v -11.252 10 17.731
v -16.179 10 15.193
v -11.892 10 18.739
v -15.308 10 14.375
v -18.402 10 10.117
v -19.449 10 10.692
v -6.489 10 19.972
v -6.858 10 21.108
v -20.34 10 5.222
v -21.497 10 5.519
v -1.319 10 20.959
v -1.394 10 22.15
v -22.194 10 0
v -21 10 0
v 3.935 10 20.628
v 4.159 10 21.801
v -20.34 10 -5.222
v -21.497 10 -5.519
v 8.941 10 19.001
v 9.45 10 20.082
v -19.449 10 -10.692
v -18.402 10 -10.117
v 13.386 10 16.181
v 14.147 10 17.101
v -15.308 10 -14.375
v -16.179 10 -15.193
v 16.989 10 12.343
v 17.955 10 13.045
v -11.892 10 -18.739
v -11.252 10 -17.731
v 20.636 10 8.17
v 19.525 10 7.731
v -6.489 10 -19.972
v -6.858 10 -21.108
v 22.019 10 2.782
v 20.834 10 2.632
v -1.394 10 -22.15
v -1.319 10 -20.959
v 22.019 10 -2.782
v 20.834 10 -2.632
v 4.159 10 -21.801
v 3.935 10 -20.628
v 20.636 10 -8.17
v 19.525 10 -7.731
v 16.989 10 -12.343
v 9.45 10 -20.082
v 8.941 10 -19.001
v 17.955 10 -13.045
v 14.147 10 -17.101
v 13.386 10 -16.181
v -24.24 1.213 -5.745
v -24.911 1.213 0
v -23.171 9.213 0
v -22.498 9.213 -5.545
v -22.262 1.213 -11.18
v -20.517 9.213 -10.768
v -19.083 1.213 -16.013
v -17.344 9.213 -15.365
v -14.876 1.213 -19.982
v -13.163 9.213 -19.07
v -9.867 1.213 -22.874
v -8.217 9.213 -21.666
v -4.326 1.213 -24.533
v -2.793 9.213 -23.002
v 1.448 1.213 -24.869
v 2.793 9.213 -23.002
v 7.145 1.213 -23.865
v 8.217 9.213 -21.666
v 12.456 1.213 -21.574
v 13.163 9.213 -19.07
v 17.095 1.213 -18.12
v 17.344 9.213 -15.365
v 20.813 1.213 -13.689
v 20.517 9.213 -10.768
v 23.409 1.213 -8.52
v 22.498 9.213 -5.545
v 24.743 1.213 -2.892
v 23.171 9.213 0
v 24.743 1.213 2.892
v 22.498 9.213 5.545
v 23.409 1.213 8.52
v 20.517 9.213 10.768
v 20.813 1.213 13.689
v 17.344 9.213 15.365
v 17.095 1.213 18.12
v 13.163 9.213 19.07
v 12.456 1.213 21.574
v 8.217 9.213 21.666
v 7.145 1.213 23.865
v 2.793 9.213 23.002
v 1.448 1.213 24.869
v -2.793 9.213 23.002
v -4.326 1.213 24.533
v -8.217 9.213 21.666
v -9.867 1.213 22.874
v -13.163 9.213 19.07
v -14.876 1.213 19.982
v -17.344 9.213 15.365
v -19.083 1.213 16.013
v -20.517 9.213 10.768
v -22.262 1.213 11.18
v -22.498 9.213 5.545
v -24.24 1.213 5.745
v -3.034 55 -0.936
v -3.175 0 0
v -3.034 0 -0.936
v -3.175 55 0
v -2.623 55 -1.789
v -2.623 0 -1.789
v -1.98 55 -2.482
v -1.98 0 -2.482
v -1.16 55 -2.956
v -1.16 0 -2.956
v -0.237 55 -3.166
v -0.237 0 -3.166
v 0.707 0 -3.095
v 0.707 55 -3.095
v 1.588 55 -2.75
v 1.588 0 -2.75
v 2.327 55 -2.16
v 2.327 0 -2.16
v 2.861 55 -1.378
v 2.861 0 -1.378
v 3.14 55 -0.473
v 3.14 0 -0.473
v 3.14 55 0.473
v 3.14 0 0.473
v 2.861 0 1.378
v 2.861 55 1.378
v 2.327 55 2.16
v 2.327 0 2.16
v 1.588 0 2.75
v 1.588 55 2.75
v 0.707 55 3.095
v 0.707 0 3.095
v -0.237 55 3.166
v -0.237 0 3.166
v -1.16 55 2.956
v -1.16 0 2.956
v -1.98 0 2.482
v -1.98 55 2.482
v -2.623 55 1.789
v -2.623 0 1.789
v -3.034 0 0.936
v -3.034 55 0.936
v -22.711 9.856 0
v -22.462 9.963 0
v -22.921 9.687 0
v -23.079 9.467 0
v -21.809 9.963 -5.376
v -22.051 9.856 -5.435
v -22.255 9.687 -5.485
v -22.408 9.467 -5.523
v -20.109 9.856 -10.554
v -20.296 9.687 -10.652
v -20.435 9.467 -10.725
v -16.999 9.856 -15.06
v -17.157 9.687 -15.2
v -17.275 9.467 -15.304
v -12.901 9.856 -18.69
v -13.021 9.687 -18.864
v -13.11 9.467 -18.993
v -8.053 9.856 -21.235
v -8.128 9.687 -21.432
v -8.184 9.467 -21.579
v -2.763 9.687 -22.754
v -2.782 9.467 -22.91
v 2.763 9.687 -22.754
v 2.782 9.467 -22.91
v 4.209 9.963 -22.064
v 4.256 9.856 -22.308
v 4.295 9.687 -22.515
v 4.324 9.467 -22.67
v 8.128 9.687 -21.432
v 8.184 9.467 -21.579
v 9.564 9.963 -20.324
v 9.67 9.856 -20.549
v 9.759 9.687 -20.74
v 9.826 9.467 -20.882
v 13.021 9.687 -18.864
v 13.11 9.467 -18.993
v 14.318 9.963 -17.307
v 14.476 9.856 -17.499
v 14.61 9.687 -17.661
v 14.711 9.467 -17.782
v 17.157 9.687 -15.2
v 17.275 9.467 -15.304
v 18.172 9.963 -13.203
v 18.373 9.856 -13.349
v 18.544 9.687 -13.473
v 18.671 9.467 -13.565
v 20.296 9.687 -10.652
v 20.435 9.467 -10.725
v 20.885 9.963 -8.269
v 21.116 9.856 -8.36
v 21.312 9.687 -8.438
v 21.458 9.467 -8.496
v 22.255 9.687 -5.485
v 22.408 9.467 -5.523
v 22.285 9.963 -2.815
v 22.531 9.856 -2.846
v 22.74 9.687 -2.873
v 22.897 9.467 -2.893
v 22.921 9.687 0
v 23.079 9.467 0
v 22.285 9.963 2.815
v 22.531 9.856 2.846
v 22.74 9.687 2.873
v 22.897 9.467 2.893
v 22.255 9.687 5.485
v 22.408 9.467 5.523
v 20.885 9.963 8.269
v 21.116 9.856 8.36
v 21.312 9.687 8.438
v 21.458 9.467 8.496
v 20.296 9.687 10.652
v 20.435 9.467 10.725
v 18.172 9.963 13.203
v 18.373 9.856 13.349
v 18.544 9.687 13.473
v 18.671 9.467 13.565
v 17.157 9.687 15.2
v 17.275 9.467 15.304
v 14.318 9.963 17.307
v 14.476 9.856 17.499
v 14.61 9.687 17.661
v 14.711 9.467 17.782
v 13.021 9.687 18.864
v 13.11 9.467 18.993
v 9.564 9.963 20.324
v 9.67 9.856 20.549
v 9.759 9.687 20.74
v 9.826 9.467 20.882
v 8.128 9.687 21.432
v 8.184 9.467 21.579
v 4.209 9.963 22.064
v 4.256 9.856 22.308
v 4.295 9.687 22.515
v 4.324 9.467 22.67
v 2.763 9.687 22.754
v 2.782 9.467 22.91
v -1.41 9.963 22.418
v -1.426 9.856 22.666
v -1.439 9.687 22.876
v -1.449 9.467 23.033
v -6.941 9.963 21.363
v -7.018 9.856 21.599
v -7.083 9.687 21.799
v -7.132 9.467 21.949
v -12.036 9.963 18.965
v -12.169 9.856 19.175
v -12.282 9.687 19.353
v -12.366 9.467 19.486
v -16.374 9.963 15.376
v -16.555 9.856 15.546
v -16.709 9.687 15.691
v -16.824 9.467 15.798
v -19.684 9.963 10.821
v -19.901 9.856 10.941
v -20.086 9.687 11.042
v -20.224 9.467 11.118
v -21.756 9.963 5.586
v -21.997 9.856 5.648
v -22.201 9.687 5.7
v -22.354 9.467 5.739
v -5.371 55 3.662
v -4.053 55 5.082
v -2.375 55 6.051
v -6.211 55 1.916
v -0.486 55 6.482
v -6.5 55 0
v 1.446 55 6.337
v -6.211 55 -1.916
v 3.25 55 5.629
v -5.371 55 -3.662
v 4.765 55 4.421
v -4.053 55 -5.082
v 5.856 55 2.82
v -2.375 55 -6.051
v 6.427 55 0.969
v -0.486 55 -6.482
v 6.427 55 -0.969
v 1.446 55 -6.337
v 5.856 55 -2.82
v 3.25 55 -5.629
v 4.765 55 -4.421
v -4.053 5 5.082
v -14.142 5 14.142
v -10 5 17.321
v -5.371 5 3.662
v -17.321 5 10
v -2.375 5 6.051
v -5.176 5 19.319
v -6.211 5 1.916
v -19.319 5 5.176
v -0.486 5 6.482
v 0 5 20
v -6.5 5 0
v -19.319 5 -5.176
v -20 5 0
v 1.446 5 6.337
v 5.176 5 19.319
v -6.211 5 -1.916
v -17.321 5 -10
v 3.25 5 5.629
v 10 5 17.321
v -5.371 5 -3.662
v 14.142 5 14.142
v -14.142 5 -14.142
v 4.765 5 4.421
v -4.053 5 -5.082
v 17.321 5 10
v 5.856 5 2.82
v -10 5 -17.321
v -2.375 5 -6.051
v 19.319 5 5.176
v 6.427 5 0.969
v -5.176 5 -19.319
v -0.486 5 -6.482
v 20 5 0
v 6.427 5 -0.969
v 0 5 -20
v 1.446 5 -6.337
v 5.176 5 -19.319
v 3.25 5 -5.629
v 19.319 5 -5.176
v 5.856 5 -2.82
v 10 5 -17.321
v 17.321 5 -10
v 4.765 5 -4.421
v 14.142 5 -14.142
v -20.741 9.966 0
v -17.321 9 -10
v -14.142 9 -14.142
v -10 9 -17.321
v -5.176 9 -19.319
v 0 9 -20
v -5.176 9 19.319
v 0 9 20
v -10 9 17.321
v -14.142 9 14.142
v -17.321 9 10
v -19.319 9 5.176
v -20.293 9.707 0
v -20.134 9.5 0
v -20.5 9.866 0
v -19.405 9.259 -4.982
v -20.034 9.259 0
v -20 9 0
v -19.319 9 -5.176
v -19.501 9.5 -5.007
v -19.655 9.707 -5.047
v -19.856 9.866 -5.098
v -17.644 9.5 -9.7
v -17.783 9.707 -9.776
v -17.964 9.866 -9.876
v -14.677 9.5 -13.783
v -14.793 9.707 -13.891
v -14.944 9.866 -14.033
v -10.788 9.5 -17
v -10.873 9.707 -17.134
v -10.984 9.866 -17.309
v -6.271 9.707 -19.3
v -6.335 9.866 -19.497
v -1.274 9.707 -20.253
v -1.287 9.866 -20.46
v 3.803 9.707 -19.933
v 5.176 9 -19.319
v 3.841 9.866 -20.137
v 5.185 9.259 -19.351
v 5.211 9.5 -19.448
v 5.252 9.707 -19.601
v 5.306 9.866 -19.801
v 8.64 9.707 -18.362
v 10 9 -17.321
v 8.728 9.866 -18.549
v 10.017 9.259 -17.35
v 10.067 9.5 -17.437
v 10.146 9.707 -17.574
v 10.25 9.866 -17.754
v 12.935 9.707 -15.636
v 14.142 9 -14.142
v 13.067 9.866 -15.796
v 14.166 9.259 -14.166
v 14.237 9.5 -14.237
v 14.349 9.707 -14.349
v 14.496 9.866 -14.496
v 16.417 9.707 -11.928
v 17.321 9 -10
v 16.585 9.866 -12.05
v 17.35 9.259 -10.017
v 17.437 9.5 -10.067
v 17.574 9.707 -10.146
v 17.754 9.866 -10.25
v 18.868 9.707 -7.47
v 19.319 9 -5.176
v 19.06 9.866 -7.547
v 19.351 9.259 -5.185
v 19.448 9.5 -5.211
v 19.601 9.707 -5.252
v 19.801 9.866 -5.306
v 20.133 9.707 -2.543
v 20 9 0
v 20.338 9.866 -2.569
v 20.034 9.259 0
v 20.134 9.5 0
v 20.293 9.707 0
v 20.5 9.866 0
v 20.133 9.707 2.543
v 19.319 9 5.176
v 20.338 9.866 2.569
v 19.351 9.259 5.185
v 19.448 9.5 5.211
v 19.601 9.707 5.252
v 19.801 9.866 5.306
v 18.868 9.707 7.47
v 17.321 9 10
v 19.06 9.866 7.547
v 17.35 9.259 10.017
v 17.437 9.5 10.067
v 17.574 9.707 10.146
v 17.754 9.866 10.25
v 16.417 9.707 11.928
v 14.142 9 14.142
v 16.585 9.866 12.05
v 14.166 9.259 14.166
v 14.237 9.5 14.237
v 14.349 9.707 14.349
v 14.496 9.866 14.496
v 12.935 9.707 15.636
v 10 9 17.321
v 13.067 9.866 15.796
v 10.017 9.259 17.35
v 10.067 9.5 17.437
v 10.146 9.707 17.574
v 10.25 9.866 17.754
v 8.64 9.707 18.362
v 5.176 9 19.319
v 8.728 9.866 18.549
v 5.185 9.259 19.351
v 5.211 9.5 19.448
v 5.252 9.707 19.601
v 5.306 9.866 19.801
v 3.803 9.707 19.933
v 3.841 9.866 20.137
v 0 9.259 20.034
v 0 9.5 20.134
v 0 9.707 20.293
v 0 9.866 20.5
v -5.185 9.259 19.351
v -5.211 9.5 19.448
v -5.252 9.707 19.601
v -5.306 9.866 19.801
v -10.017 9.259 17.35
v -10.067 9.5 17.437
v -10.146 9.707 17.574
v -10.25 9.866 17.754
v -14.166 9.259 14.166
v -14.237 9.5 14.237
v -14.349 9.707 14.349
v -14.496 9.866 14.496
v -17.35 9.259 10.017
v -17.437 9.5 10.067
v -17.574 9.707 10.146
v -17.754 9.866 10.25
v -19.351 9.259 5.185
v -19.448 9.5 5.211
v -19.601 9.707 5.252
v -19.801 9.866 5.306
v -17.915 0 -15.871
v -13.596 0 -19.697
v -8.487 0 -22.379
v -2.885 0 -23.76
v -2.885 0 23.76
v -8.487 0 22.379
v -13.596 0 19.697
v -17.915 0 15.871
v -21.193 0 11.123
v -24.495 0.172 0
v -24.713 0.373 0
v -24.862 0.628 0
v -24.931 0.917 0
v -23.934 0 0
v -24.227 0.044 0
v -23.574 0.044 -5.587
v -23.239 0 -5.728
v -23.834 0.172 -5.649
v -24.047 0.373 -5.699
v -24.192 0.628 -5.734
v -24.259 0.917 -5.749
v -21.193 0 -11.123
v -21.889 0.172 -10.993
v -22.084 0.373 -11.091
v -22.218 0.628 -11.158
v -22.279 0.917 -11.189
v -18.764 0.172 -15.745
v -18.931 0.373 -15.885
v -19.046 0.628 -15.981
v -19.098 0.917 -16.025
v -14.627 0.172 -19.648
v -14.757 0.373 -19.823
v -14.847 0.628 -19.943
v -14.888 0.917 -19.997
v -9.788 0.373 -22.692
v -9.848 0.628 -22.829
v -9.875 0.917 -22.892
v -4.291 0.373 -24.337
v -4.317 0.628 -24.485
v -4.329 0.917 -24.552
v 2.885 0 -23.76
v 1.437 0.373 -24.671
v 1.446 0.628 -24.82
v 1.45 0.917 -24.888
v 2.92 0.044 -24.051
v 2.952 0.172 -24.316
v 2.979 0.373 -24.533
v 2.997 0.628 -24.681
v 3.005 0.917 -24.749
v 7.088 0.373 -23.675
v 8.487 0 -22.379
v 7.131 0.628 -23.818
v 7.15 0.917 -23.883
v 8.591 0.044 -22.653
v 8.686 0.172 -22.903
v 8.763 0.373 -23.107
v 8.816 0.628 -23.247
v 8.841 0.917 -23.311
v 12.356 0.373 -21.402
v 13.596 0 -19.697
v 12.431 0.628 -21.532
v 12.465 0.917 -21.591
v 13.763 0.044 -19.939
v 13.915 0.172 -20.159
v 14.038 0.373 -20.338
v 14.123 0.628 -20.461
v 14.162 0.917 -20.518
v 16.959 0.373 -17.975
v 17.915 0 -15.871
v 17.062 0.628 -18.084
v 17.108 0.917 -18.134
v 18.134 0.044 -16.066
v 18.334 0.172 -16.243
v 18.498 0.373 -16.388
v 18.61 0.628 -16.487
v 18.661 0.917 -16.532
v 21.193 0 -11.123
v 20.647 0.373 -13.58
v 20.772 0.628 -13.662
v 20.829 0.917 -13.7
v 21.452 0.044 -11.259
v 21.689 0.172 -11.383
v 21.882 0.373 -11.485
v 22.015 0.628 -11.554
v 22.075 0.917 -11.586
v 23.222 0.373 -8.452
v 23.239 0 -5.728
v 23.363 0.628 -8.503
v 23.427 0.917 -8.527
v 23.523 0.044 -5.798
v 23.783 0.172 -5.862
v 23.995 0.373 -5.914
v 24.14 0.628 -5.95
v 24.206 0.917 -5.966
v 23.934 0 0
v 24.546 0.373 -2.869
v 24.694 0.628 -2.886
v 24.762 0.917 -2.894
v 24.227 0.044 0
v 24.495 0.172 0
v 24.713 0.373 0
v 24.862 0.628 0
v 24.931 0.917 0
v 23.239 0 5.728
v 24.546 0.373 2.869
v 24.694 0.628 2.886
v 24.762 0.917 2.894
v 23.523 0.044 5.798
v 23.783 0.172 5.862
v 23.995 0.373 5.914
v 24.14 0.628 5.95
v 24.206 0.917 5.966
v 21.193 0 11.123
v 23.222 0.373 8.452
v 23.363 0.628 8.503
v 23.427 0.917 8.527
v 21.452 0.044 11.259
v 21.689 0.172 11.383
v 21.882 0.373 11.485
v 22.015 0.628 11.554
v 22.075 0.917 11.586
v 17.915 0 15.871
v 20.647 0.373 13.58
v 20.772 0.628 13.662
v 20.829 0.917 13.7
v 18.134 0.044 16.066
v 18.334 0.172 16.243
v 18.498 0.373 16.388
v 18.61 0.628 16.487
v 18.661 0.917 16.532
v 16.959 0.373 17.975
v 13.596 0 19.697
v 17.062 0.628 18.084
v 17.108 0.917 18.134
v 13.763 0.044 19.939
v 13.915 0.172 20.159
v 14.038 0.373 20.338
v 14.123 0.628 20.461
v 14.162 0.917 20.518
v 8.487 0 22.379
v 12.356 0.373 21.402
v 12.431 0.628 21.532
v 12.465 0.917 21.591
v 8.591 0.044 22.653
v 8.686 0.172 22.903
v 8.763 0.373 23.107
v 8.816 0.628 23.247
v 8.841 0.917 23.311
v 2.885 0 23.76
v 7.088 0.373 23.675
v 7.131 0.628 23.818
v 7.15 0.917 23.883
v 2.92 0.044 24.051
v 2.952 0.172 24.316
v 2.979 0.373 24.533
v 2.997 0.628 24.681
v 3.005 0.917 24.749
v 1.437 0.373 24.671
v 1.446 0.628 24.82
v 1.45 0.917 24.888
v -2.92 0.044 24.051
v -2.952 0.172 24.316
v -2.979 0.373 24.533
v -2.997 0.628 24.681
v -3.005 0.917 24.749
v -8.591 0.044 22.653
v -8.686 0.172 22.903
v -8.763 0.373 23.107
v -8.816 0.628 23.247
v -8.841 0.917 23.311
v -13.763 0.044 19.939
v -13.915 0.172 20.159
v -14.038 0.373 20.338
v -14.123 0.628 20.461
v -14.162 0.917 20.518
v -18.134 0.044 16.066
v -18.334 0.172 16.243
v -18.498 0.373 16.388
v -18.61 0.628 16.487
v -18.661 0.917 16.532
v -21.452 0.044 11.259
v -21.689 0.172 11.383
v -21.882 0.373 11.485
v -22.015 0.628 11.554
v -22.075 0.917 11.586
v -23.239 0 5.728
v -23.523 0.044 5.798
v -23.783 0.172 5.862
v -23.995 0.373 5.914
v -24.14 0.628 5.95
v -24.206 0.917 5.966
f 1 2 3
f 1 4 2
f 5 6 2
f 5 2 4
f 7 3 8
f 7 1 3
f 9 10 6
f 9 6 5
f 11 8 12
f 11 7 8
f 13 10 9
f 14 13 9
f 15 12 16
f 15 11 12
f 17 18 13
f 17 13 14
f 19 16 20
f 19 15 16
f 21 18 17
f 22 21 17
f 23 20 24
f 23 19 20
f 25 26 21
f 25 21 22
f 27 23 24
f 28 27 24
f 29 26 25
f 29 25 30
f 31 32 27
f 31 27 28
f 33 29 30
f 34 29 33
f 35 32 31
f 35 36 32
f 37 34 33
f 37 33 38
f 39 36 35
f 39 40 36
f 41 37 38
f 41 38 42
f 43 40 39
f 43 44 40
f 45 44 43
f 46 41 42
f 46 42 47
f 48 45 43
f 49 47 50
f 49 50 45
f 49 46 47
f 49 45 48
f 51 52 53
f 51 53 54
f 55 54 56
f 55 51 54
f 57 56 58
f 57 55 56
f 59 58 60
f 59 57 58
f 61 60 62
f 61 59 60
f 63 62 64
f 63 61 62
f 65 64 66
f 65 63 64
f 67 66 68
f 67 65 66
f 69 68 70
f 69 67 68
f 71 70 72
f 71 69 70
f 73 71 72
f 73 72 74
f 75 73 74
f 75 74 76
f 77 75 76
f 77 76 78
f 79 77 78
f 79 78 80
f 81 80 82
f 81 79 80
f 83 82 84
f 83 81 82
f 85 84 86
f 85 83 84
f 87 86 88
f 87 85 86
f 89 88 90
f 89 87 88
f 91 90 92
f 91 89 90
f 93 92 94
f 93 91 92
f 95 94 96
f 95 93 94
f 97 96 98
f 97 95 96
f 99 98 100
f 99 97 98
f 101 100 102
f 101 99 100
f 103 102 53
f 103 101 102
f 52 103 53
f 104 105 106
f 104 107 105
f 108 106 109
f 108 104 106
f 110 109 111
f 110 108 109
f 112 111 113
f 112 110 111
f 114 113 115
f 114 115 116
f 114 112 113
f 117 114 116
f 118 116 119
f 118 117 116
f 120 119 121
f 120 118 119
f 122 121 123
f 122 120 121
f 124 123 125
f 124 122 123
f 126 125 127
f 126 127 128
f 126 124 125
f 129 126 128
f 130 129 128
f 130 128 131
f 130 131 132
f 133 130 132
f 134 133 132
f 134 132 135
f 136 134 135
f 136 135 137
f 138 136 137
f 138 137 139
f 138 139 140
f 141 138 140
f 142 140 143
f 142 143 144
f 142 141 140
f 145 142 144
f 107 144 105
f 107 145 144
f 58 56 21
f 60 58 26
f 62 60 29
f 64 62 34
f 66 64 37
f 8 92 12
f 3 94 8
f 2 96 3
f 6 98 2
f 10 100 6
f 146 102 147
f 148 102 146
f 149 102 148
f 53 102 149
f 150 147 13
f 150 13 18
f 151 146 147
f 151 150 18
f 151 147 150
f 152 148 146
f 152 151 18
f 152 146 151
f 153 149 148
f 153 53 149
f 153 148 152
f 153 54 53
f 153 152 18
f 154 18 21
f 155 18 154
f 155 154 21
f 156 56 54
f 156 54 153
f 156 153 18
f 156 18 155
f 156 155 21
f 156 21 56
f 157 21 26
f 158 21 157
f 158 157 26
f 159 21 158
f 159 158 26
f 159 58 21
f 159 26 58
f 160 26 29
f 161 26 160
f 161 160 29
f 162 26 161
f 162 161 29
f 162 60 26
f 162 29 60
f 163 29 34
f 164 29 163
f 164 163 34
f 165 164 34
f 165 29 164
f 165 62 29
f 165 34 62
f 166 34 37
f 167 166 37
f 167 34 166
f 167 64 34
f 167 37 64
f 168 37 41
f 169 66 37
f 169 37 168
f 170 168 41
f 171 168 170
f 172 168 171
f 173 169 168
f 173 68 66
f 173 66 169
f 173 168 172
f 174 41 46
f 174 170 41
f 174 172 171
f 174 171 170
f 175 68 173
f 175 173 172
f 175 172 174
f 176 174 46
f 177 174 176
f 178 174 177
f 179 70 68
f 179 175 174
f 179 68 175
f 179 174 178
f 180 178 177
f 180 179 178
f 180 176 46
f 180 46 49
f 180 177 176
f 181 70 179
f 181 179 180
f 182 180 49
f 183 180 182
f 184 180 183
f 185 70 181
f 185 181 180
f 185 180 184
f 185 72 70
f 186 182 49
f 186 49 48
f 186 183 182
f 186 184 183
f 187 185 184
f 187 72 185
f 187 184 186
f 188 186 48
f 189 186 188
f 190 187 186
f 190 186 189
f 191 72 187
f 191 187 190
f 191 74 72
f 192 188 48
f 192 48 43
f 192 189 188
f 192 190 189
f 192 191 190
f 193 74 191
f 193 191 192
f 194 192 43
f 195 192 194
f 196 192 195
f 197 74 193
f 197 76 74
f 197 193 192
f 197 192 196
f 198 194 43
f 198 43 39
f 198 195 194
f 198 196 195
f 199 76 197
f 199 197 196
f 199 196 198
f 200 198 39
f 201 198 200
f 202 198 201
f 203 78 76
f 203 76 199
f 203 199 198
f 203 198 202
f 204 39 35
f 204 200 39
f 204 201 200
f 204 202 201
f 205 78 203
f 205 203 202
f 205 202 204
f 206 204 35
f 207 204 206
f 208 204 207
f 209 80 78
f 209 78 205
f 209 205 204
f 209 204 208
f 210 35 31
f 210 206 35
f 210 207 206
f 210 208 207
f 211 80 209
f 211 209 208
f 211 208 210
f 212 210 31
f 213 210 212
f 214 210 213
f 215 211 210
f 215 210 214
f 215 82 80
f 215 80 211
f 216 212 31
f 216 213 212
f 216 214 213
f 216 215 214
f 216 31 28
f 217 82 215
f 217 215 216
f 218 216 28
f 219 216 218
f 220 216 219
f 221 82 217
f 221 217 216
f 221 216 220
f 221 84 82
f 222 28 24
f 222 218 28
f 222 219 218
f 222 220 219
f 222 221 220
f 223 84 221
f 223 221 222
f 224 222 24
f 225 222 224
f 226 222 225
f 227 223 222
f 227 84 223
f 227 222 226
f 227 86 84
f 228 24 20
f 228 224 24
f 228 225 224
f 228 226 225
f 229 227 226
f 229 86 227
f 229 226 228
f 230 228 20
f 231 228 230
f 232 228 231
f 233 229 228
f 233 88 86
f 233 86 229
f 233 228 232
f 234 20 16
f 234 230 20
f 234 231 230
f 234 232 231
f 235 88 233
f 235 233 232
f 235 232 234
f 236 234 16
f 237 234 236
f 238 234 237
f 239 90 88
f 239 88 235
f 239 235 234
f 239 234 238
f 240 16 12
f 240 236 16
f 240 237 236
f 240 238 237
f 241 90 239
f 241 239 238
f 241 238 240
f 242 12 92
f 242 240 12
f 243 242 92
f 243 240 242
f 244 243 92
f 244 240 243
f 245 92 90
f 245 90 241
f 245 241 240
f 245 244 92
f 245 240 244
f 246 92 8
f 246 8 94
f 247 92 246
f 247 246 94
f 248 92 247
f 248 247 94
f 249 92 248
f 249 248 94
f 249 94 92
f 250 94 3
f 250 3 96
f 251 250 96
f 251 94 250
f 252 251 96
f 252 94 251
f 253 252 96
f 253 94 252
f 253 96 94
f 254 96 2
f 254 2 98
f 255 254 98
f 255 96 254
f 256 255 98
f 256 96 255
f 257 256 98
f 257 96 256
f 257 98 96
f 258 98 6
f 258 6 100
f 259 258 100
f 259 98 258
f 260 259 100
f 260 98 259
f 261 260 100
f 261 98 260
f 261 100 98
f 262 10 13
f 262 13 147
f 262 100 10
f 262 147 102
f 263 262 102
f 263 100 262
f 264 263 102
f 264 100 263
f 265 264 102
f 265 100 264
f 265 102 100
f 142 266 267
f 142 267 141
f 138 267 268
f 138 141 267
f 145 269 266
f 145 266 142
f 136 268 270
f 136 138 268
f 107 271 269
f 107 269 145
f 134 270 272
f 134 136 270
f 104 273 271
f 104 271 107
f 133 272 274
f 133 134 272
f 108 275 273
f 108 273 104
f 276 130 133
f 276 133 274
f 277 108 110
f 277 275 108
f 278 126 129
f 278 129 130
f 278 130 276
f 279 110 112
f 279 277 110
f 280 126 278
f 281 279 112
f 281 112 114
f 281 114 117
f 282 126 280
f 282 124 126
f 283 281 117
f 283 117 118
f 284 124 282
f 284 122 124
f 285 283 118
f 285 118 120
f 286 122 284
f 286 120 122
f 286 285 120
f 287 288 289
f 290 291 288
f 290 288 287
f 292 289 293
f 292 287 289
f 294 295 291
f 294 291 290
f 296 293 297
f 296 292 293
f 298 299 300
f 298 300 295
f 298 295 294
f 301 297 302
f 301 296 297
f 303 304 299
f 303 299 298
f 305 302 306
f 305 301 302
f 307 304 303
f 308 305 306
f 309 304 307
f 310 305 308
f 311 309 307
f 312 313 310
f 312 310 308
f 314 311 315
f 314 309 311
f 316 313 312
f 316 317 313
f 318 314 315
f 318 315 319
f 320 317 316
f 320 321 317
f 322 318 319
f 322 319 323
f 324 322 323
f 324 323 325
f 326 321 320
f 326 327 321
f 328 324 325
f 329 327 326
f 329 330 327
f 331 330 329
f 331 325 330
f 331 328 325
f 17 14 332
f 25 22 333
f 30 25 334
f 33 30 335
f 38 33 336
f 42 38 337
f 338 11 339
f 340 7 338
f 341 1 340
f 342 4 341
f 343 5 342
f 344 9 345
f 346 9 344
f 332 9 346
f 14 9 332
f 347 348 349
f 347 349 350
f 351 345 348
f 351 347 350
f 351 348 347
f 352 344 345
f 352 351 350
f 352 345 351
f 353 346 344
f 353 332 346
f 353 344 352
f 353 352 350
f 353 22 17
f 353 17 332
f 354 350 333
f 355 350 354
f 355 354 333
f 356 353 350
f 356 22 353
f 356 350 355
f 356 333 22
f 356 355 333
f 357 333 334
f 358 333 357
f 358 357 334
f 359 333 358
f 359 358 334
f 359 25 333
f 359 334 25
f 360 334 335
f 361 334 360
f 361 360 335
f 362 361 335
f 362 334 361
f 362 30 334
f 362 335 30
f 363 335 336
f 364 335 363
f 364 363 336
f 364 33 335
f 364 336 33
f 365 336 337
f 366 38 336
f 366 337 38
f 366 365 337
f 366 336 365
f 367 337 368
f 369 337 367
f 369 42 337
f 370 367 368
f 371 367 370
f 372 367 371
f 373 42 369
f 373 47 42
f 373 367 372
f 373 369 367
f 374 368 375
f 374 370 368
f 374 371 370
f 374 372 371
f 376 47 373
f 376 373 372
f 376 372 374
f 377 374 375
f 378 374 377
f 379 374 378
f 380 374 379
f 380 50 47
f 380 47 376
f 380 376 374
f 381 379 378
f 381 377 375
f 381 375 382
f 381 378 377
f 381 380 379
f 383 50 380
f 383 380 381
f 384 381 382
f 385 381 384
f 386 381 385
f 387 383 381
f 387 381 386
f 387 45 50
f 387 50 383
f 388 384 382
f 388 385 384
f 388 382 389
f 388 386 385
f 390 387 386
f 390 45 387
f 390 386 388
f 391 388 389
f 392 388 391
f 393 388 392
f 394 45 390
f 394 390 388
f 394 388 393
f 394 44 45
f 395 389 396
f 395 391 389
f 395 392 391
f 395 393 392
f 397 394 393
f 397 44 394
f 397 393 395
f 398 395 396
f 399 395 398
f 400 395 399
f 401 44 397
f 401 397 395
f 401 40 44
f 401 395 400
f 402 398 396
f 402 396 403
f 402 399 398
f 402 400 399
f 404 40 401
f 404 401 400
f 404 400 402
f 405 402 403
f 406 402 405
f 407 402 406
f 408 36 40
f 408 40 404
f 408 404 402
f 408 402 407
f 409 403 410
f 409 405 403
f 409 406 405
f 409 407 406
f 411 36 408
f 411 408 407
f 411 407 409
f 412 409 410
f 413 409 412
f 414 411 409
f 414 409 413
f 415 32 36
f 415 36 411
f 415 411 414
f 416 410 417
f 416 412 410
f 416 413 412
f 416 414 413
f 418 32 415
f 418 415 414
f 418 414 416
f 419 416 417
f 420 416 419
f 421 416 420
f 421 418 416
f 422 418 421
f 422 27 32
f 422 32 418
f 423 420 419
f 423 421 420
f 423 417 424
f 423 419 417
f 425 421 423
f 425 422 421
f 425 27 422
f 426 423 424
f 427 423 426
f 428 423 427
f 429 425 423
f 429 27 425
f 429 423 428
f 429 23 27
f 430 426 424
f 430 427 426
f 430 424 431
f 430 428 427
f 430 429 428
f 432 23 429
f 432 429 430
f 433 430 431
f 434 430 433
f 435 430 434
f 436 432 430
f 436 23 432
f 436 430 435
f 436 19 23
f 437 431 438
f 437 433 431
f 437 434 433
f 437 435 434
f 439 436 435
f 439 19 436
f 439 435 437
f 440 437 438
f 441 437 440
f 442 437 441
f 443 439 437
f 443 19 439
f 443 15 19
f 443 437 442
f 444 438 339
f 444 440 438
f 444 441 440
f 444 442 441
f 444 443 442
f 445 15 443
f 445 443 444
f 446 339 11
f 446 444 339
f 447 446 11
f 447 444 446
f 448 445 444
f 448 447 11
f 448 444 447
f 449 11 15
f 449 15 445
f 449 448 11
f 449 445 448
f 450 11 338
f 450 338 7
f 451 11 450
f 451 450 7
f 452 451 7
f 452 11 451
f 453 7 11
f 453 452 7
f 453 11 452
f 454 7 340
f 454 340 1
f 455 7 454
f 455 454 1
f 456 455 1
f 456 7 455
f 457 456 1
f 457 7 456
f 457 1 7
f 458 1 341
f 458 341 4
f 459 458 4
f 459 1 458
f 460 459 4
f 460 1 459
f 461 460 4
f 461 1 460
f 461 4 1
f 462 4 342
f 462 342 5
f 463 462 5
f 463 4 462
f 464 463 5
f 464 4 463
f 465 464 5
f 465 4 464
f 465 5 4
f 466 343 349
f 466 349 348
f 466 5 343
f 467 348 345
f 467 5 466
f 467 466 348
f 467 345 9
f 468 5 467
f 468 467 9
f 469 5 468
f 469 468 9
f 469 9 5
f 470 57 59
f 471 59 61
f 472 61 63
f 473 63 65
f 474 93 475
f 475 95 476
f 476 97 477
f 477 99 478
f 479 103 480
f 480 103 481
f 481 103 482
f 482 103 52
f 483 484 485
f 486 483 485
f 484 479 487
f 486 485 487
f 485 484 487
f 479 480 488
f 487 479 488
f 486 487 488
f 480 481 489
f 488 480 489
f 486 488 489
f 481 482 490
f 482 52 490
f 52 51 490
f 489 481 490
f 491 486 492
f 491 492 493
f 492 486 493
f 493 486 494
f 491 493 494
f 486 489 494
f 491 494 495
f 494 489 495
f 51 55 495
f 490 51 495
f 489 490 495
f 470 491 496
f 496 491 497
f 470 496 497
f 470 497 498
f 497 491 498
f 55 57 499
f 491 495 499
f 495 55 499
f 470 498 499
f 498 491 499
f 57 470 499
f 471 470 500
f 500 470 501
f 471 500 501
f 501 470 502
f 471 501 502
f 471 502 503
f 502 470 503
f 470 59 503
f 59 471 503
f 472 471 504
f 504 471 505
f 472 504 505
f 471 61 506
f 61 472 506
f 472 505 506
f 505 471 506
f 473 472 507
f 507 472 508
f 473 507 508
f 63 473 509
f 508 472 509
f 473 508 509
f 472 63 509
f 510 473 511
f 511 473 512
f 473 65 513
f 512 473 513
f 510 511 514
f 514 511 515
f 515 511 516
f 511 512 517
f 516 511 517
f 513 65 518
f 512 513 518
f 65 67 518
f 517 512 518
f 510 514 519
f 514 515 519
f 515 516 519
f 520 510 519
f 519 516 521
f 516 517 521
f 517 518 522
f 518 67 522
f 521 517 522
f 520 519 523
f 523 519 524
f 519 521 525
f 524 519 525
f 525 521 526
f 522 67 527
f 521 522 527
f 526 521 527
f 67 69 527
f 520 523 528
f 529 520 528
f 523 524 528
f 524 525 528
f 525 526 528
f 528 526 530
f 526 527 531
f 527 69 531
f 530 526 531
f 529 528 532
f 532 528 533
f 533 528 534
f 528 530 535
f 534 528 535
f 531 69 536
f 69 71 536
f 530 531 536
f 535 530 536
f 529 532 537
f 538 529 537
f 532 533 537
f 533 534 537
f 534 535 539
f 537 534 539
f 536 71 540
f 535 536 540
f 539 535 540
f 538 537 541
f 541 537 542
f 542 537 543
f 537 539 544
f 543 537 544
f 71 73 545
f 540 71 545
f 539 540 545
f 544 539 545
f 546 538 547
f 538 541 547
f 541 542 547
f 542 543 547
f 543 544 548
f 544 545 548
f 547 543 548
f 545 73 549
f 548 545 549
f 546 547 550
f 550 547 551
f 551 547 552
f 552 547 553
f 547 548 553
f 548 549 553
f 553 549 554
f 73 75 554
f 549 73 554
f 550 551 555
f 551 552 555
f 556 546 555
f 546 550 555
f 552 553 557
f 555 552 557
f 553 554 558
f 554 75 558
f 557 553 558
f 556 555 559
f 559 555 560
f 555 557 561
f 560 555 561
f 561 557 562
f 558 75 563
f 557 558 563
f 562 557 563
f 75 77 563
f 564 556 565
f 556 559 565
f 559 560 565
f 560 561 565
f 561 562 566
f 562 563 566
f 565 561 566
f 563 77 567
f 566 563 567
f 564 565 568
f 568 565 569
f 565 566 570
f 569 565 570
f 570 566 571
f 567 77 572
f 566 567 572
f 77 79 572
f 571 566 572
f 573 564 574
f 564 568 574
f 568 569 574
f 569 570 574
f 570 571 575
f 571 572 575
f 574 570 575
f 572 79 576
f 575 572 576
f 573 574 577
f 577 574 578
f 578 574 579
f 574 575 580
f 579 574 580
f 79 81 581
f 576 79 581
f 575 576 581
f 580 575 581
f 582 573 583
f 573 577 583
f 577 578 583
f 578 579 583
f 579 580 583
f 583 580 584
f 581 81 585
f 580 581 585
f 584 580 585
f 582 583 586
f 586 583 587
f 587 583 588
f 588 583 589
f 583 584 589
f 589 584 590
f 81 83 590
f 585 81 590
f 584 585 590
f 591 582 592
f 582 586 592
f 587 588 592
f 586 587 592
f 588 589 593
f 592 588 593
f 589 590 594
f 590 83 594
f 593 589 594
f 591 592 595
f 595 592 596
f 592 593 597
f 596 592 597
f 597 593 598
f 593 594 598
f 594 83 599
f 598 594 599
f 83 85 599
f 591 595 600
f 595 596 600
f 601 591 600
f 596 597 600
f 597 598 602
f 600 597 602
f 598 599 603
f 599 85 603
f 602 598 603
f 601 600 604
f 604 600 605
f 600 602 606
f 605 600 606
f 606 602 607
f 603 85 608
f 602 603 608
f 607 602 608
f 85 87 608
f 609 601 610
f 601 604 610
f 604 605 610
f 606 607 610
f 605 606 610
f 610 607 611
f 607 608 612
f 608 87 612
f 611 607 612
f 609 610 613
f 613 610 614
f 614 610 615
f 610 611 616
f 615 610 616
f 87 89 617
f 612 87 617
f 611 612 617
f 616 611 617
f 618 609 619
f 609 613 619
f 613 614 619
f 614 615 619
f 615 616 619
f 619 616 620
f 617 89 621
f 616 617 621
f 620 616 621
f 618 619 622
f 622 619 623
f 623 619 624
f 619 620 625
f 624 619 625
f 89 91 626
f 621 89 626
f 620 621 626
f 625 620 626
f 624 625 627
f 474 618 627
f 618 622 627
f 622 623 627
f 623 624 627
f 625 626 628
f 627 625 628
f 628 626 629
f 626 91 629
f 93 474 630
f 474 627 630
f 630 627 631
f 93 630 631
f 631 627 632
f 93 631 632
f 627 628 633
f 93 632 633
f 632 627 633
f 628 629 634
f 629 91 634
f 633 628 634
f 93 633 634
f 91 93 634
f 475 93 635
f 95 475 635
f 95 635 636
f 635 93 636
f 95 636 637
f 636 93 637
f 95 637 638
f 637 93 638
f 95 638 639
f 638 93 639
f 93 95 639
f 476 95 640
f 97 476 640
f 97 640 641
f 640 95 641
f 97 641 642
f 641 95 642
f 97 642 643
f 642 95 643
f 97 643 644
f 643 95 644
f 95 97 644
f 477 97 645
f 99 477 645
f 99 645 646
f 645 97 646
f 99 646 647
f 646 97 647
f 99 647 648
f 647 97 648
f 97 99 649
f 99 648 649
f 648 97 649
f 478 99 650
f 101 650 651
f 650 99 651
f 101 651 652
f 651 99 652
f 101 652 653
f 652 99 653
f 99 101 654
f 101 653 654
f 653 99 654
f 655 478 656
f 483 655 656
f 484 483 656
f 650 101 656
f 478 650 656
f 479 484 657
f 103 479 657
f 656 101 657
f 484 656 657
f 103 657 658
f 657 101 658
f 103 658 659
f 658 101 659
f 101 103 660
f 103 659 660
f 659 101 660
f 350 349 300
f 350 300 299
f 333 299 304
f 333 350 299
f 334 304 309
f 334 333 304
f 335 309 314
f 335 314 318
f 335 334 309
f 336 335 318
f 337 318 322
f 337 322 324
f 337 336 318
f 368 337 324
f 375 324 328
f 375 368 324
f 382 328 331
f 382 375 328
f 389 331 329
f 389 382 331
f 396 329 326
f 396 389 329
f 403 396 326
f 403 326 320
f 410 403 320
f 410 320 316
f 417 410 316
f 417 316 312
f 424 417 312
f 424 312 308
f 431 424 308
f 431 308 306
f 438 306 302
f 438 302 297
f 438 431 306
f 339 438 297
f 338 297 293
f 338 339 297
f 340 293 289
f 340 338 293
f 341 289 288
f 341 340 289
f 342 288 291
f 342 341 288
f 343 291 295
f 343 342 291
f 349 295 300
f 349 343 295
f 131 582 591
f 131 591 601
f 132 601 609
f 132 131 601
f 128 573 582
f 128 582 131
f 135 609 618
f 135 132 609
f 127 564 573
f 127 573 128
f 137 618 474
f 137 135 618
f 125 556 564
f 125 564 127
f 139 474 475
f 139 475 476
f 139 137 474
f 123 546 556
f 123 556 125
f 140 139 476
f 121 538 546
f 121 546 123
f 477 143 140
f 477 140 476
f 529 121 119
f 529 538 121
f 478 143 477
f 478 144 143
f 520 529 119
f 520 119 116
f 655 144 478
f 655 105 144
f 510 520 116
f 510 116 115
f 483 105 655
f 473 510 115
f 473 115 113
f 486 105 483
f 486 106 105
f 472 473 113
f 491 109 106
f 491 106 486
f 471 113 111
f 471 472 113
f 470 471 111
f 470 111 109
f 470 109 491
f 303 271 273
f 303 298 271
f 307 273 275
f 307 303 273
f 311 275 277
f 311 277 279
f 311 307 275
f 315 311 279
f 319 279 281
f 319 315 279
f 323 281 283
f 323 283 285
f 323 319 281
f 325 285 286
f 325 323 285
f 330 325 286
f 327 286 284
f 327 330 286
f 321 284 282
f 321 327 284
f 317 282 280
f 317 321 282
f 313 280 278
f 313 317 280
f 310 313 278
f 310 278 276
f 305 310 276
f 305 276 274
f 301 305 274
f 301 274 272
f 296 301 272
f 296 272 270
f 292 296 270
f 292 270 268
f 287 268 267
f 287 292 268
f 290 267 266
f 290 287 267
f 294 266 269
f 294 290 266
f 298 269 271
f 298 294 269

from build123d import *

# Parameters (mm, degrees)
F2_R = 1


with BuildPart() as f1:
    # F0 (on Top) → F1 (revolve)
    with BuildSketch(Plane.XY):
        Polygon((-25.175, 0), (-3.175, 0), (-3.175, 55), (-6.5, 55), (-6.5, 5), (-20, 5), (-20, 10), (-23, 10), align=None)
    revolve(axis=Axis((0, 30.933686, 0), (0, -1, 0)))

    # F2
    f2_edges = [f1.edges().sort_by_distance(p)[0] for p in [
        (25.175, 0, 0),
        (23, 10, 0),
        (20, 10, 0),
    ]]
    fillet(f2_edges, radius=F2_R)


solid = f1.part
